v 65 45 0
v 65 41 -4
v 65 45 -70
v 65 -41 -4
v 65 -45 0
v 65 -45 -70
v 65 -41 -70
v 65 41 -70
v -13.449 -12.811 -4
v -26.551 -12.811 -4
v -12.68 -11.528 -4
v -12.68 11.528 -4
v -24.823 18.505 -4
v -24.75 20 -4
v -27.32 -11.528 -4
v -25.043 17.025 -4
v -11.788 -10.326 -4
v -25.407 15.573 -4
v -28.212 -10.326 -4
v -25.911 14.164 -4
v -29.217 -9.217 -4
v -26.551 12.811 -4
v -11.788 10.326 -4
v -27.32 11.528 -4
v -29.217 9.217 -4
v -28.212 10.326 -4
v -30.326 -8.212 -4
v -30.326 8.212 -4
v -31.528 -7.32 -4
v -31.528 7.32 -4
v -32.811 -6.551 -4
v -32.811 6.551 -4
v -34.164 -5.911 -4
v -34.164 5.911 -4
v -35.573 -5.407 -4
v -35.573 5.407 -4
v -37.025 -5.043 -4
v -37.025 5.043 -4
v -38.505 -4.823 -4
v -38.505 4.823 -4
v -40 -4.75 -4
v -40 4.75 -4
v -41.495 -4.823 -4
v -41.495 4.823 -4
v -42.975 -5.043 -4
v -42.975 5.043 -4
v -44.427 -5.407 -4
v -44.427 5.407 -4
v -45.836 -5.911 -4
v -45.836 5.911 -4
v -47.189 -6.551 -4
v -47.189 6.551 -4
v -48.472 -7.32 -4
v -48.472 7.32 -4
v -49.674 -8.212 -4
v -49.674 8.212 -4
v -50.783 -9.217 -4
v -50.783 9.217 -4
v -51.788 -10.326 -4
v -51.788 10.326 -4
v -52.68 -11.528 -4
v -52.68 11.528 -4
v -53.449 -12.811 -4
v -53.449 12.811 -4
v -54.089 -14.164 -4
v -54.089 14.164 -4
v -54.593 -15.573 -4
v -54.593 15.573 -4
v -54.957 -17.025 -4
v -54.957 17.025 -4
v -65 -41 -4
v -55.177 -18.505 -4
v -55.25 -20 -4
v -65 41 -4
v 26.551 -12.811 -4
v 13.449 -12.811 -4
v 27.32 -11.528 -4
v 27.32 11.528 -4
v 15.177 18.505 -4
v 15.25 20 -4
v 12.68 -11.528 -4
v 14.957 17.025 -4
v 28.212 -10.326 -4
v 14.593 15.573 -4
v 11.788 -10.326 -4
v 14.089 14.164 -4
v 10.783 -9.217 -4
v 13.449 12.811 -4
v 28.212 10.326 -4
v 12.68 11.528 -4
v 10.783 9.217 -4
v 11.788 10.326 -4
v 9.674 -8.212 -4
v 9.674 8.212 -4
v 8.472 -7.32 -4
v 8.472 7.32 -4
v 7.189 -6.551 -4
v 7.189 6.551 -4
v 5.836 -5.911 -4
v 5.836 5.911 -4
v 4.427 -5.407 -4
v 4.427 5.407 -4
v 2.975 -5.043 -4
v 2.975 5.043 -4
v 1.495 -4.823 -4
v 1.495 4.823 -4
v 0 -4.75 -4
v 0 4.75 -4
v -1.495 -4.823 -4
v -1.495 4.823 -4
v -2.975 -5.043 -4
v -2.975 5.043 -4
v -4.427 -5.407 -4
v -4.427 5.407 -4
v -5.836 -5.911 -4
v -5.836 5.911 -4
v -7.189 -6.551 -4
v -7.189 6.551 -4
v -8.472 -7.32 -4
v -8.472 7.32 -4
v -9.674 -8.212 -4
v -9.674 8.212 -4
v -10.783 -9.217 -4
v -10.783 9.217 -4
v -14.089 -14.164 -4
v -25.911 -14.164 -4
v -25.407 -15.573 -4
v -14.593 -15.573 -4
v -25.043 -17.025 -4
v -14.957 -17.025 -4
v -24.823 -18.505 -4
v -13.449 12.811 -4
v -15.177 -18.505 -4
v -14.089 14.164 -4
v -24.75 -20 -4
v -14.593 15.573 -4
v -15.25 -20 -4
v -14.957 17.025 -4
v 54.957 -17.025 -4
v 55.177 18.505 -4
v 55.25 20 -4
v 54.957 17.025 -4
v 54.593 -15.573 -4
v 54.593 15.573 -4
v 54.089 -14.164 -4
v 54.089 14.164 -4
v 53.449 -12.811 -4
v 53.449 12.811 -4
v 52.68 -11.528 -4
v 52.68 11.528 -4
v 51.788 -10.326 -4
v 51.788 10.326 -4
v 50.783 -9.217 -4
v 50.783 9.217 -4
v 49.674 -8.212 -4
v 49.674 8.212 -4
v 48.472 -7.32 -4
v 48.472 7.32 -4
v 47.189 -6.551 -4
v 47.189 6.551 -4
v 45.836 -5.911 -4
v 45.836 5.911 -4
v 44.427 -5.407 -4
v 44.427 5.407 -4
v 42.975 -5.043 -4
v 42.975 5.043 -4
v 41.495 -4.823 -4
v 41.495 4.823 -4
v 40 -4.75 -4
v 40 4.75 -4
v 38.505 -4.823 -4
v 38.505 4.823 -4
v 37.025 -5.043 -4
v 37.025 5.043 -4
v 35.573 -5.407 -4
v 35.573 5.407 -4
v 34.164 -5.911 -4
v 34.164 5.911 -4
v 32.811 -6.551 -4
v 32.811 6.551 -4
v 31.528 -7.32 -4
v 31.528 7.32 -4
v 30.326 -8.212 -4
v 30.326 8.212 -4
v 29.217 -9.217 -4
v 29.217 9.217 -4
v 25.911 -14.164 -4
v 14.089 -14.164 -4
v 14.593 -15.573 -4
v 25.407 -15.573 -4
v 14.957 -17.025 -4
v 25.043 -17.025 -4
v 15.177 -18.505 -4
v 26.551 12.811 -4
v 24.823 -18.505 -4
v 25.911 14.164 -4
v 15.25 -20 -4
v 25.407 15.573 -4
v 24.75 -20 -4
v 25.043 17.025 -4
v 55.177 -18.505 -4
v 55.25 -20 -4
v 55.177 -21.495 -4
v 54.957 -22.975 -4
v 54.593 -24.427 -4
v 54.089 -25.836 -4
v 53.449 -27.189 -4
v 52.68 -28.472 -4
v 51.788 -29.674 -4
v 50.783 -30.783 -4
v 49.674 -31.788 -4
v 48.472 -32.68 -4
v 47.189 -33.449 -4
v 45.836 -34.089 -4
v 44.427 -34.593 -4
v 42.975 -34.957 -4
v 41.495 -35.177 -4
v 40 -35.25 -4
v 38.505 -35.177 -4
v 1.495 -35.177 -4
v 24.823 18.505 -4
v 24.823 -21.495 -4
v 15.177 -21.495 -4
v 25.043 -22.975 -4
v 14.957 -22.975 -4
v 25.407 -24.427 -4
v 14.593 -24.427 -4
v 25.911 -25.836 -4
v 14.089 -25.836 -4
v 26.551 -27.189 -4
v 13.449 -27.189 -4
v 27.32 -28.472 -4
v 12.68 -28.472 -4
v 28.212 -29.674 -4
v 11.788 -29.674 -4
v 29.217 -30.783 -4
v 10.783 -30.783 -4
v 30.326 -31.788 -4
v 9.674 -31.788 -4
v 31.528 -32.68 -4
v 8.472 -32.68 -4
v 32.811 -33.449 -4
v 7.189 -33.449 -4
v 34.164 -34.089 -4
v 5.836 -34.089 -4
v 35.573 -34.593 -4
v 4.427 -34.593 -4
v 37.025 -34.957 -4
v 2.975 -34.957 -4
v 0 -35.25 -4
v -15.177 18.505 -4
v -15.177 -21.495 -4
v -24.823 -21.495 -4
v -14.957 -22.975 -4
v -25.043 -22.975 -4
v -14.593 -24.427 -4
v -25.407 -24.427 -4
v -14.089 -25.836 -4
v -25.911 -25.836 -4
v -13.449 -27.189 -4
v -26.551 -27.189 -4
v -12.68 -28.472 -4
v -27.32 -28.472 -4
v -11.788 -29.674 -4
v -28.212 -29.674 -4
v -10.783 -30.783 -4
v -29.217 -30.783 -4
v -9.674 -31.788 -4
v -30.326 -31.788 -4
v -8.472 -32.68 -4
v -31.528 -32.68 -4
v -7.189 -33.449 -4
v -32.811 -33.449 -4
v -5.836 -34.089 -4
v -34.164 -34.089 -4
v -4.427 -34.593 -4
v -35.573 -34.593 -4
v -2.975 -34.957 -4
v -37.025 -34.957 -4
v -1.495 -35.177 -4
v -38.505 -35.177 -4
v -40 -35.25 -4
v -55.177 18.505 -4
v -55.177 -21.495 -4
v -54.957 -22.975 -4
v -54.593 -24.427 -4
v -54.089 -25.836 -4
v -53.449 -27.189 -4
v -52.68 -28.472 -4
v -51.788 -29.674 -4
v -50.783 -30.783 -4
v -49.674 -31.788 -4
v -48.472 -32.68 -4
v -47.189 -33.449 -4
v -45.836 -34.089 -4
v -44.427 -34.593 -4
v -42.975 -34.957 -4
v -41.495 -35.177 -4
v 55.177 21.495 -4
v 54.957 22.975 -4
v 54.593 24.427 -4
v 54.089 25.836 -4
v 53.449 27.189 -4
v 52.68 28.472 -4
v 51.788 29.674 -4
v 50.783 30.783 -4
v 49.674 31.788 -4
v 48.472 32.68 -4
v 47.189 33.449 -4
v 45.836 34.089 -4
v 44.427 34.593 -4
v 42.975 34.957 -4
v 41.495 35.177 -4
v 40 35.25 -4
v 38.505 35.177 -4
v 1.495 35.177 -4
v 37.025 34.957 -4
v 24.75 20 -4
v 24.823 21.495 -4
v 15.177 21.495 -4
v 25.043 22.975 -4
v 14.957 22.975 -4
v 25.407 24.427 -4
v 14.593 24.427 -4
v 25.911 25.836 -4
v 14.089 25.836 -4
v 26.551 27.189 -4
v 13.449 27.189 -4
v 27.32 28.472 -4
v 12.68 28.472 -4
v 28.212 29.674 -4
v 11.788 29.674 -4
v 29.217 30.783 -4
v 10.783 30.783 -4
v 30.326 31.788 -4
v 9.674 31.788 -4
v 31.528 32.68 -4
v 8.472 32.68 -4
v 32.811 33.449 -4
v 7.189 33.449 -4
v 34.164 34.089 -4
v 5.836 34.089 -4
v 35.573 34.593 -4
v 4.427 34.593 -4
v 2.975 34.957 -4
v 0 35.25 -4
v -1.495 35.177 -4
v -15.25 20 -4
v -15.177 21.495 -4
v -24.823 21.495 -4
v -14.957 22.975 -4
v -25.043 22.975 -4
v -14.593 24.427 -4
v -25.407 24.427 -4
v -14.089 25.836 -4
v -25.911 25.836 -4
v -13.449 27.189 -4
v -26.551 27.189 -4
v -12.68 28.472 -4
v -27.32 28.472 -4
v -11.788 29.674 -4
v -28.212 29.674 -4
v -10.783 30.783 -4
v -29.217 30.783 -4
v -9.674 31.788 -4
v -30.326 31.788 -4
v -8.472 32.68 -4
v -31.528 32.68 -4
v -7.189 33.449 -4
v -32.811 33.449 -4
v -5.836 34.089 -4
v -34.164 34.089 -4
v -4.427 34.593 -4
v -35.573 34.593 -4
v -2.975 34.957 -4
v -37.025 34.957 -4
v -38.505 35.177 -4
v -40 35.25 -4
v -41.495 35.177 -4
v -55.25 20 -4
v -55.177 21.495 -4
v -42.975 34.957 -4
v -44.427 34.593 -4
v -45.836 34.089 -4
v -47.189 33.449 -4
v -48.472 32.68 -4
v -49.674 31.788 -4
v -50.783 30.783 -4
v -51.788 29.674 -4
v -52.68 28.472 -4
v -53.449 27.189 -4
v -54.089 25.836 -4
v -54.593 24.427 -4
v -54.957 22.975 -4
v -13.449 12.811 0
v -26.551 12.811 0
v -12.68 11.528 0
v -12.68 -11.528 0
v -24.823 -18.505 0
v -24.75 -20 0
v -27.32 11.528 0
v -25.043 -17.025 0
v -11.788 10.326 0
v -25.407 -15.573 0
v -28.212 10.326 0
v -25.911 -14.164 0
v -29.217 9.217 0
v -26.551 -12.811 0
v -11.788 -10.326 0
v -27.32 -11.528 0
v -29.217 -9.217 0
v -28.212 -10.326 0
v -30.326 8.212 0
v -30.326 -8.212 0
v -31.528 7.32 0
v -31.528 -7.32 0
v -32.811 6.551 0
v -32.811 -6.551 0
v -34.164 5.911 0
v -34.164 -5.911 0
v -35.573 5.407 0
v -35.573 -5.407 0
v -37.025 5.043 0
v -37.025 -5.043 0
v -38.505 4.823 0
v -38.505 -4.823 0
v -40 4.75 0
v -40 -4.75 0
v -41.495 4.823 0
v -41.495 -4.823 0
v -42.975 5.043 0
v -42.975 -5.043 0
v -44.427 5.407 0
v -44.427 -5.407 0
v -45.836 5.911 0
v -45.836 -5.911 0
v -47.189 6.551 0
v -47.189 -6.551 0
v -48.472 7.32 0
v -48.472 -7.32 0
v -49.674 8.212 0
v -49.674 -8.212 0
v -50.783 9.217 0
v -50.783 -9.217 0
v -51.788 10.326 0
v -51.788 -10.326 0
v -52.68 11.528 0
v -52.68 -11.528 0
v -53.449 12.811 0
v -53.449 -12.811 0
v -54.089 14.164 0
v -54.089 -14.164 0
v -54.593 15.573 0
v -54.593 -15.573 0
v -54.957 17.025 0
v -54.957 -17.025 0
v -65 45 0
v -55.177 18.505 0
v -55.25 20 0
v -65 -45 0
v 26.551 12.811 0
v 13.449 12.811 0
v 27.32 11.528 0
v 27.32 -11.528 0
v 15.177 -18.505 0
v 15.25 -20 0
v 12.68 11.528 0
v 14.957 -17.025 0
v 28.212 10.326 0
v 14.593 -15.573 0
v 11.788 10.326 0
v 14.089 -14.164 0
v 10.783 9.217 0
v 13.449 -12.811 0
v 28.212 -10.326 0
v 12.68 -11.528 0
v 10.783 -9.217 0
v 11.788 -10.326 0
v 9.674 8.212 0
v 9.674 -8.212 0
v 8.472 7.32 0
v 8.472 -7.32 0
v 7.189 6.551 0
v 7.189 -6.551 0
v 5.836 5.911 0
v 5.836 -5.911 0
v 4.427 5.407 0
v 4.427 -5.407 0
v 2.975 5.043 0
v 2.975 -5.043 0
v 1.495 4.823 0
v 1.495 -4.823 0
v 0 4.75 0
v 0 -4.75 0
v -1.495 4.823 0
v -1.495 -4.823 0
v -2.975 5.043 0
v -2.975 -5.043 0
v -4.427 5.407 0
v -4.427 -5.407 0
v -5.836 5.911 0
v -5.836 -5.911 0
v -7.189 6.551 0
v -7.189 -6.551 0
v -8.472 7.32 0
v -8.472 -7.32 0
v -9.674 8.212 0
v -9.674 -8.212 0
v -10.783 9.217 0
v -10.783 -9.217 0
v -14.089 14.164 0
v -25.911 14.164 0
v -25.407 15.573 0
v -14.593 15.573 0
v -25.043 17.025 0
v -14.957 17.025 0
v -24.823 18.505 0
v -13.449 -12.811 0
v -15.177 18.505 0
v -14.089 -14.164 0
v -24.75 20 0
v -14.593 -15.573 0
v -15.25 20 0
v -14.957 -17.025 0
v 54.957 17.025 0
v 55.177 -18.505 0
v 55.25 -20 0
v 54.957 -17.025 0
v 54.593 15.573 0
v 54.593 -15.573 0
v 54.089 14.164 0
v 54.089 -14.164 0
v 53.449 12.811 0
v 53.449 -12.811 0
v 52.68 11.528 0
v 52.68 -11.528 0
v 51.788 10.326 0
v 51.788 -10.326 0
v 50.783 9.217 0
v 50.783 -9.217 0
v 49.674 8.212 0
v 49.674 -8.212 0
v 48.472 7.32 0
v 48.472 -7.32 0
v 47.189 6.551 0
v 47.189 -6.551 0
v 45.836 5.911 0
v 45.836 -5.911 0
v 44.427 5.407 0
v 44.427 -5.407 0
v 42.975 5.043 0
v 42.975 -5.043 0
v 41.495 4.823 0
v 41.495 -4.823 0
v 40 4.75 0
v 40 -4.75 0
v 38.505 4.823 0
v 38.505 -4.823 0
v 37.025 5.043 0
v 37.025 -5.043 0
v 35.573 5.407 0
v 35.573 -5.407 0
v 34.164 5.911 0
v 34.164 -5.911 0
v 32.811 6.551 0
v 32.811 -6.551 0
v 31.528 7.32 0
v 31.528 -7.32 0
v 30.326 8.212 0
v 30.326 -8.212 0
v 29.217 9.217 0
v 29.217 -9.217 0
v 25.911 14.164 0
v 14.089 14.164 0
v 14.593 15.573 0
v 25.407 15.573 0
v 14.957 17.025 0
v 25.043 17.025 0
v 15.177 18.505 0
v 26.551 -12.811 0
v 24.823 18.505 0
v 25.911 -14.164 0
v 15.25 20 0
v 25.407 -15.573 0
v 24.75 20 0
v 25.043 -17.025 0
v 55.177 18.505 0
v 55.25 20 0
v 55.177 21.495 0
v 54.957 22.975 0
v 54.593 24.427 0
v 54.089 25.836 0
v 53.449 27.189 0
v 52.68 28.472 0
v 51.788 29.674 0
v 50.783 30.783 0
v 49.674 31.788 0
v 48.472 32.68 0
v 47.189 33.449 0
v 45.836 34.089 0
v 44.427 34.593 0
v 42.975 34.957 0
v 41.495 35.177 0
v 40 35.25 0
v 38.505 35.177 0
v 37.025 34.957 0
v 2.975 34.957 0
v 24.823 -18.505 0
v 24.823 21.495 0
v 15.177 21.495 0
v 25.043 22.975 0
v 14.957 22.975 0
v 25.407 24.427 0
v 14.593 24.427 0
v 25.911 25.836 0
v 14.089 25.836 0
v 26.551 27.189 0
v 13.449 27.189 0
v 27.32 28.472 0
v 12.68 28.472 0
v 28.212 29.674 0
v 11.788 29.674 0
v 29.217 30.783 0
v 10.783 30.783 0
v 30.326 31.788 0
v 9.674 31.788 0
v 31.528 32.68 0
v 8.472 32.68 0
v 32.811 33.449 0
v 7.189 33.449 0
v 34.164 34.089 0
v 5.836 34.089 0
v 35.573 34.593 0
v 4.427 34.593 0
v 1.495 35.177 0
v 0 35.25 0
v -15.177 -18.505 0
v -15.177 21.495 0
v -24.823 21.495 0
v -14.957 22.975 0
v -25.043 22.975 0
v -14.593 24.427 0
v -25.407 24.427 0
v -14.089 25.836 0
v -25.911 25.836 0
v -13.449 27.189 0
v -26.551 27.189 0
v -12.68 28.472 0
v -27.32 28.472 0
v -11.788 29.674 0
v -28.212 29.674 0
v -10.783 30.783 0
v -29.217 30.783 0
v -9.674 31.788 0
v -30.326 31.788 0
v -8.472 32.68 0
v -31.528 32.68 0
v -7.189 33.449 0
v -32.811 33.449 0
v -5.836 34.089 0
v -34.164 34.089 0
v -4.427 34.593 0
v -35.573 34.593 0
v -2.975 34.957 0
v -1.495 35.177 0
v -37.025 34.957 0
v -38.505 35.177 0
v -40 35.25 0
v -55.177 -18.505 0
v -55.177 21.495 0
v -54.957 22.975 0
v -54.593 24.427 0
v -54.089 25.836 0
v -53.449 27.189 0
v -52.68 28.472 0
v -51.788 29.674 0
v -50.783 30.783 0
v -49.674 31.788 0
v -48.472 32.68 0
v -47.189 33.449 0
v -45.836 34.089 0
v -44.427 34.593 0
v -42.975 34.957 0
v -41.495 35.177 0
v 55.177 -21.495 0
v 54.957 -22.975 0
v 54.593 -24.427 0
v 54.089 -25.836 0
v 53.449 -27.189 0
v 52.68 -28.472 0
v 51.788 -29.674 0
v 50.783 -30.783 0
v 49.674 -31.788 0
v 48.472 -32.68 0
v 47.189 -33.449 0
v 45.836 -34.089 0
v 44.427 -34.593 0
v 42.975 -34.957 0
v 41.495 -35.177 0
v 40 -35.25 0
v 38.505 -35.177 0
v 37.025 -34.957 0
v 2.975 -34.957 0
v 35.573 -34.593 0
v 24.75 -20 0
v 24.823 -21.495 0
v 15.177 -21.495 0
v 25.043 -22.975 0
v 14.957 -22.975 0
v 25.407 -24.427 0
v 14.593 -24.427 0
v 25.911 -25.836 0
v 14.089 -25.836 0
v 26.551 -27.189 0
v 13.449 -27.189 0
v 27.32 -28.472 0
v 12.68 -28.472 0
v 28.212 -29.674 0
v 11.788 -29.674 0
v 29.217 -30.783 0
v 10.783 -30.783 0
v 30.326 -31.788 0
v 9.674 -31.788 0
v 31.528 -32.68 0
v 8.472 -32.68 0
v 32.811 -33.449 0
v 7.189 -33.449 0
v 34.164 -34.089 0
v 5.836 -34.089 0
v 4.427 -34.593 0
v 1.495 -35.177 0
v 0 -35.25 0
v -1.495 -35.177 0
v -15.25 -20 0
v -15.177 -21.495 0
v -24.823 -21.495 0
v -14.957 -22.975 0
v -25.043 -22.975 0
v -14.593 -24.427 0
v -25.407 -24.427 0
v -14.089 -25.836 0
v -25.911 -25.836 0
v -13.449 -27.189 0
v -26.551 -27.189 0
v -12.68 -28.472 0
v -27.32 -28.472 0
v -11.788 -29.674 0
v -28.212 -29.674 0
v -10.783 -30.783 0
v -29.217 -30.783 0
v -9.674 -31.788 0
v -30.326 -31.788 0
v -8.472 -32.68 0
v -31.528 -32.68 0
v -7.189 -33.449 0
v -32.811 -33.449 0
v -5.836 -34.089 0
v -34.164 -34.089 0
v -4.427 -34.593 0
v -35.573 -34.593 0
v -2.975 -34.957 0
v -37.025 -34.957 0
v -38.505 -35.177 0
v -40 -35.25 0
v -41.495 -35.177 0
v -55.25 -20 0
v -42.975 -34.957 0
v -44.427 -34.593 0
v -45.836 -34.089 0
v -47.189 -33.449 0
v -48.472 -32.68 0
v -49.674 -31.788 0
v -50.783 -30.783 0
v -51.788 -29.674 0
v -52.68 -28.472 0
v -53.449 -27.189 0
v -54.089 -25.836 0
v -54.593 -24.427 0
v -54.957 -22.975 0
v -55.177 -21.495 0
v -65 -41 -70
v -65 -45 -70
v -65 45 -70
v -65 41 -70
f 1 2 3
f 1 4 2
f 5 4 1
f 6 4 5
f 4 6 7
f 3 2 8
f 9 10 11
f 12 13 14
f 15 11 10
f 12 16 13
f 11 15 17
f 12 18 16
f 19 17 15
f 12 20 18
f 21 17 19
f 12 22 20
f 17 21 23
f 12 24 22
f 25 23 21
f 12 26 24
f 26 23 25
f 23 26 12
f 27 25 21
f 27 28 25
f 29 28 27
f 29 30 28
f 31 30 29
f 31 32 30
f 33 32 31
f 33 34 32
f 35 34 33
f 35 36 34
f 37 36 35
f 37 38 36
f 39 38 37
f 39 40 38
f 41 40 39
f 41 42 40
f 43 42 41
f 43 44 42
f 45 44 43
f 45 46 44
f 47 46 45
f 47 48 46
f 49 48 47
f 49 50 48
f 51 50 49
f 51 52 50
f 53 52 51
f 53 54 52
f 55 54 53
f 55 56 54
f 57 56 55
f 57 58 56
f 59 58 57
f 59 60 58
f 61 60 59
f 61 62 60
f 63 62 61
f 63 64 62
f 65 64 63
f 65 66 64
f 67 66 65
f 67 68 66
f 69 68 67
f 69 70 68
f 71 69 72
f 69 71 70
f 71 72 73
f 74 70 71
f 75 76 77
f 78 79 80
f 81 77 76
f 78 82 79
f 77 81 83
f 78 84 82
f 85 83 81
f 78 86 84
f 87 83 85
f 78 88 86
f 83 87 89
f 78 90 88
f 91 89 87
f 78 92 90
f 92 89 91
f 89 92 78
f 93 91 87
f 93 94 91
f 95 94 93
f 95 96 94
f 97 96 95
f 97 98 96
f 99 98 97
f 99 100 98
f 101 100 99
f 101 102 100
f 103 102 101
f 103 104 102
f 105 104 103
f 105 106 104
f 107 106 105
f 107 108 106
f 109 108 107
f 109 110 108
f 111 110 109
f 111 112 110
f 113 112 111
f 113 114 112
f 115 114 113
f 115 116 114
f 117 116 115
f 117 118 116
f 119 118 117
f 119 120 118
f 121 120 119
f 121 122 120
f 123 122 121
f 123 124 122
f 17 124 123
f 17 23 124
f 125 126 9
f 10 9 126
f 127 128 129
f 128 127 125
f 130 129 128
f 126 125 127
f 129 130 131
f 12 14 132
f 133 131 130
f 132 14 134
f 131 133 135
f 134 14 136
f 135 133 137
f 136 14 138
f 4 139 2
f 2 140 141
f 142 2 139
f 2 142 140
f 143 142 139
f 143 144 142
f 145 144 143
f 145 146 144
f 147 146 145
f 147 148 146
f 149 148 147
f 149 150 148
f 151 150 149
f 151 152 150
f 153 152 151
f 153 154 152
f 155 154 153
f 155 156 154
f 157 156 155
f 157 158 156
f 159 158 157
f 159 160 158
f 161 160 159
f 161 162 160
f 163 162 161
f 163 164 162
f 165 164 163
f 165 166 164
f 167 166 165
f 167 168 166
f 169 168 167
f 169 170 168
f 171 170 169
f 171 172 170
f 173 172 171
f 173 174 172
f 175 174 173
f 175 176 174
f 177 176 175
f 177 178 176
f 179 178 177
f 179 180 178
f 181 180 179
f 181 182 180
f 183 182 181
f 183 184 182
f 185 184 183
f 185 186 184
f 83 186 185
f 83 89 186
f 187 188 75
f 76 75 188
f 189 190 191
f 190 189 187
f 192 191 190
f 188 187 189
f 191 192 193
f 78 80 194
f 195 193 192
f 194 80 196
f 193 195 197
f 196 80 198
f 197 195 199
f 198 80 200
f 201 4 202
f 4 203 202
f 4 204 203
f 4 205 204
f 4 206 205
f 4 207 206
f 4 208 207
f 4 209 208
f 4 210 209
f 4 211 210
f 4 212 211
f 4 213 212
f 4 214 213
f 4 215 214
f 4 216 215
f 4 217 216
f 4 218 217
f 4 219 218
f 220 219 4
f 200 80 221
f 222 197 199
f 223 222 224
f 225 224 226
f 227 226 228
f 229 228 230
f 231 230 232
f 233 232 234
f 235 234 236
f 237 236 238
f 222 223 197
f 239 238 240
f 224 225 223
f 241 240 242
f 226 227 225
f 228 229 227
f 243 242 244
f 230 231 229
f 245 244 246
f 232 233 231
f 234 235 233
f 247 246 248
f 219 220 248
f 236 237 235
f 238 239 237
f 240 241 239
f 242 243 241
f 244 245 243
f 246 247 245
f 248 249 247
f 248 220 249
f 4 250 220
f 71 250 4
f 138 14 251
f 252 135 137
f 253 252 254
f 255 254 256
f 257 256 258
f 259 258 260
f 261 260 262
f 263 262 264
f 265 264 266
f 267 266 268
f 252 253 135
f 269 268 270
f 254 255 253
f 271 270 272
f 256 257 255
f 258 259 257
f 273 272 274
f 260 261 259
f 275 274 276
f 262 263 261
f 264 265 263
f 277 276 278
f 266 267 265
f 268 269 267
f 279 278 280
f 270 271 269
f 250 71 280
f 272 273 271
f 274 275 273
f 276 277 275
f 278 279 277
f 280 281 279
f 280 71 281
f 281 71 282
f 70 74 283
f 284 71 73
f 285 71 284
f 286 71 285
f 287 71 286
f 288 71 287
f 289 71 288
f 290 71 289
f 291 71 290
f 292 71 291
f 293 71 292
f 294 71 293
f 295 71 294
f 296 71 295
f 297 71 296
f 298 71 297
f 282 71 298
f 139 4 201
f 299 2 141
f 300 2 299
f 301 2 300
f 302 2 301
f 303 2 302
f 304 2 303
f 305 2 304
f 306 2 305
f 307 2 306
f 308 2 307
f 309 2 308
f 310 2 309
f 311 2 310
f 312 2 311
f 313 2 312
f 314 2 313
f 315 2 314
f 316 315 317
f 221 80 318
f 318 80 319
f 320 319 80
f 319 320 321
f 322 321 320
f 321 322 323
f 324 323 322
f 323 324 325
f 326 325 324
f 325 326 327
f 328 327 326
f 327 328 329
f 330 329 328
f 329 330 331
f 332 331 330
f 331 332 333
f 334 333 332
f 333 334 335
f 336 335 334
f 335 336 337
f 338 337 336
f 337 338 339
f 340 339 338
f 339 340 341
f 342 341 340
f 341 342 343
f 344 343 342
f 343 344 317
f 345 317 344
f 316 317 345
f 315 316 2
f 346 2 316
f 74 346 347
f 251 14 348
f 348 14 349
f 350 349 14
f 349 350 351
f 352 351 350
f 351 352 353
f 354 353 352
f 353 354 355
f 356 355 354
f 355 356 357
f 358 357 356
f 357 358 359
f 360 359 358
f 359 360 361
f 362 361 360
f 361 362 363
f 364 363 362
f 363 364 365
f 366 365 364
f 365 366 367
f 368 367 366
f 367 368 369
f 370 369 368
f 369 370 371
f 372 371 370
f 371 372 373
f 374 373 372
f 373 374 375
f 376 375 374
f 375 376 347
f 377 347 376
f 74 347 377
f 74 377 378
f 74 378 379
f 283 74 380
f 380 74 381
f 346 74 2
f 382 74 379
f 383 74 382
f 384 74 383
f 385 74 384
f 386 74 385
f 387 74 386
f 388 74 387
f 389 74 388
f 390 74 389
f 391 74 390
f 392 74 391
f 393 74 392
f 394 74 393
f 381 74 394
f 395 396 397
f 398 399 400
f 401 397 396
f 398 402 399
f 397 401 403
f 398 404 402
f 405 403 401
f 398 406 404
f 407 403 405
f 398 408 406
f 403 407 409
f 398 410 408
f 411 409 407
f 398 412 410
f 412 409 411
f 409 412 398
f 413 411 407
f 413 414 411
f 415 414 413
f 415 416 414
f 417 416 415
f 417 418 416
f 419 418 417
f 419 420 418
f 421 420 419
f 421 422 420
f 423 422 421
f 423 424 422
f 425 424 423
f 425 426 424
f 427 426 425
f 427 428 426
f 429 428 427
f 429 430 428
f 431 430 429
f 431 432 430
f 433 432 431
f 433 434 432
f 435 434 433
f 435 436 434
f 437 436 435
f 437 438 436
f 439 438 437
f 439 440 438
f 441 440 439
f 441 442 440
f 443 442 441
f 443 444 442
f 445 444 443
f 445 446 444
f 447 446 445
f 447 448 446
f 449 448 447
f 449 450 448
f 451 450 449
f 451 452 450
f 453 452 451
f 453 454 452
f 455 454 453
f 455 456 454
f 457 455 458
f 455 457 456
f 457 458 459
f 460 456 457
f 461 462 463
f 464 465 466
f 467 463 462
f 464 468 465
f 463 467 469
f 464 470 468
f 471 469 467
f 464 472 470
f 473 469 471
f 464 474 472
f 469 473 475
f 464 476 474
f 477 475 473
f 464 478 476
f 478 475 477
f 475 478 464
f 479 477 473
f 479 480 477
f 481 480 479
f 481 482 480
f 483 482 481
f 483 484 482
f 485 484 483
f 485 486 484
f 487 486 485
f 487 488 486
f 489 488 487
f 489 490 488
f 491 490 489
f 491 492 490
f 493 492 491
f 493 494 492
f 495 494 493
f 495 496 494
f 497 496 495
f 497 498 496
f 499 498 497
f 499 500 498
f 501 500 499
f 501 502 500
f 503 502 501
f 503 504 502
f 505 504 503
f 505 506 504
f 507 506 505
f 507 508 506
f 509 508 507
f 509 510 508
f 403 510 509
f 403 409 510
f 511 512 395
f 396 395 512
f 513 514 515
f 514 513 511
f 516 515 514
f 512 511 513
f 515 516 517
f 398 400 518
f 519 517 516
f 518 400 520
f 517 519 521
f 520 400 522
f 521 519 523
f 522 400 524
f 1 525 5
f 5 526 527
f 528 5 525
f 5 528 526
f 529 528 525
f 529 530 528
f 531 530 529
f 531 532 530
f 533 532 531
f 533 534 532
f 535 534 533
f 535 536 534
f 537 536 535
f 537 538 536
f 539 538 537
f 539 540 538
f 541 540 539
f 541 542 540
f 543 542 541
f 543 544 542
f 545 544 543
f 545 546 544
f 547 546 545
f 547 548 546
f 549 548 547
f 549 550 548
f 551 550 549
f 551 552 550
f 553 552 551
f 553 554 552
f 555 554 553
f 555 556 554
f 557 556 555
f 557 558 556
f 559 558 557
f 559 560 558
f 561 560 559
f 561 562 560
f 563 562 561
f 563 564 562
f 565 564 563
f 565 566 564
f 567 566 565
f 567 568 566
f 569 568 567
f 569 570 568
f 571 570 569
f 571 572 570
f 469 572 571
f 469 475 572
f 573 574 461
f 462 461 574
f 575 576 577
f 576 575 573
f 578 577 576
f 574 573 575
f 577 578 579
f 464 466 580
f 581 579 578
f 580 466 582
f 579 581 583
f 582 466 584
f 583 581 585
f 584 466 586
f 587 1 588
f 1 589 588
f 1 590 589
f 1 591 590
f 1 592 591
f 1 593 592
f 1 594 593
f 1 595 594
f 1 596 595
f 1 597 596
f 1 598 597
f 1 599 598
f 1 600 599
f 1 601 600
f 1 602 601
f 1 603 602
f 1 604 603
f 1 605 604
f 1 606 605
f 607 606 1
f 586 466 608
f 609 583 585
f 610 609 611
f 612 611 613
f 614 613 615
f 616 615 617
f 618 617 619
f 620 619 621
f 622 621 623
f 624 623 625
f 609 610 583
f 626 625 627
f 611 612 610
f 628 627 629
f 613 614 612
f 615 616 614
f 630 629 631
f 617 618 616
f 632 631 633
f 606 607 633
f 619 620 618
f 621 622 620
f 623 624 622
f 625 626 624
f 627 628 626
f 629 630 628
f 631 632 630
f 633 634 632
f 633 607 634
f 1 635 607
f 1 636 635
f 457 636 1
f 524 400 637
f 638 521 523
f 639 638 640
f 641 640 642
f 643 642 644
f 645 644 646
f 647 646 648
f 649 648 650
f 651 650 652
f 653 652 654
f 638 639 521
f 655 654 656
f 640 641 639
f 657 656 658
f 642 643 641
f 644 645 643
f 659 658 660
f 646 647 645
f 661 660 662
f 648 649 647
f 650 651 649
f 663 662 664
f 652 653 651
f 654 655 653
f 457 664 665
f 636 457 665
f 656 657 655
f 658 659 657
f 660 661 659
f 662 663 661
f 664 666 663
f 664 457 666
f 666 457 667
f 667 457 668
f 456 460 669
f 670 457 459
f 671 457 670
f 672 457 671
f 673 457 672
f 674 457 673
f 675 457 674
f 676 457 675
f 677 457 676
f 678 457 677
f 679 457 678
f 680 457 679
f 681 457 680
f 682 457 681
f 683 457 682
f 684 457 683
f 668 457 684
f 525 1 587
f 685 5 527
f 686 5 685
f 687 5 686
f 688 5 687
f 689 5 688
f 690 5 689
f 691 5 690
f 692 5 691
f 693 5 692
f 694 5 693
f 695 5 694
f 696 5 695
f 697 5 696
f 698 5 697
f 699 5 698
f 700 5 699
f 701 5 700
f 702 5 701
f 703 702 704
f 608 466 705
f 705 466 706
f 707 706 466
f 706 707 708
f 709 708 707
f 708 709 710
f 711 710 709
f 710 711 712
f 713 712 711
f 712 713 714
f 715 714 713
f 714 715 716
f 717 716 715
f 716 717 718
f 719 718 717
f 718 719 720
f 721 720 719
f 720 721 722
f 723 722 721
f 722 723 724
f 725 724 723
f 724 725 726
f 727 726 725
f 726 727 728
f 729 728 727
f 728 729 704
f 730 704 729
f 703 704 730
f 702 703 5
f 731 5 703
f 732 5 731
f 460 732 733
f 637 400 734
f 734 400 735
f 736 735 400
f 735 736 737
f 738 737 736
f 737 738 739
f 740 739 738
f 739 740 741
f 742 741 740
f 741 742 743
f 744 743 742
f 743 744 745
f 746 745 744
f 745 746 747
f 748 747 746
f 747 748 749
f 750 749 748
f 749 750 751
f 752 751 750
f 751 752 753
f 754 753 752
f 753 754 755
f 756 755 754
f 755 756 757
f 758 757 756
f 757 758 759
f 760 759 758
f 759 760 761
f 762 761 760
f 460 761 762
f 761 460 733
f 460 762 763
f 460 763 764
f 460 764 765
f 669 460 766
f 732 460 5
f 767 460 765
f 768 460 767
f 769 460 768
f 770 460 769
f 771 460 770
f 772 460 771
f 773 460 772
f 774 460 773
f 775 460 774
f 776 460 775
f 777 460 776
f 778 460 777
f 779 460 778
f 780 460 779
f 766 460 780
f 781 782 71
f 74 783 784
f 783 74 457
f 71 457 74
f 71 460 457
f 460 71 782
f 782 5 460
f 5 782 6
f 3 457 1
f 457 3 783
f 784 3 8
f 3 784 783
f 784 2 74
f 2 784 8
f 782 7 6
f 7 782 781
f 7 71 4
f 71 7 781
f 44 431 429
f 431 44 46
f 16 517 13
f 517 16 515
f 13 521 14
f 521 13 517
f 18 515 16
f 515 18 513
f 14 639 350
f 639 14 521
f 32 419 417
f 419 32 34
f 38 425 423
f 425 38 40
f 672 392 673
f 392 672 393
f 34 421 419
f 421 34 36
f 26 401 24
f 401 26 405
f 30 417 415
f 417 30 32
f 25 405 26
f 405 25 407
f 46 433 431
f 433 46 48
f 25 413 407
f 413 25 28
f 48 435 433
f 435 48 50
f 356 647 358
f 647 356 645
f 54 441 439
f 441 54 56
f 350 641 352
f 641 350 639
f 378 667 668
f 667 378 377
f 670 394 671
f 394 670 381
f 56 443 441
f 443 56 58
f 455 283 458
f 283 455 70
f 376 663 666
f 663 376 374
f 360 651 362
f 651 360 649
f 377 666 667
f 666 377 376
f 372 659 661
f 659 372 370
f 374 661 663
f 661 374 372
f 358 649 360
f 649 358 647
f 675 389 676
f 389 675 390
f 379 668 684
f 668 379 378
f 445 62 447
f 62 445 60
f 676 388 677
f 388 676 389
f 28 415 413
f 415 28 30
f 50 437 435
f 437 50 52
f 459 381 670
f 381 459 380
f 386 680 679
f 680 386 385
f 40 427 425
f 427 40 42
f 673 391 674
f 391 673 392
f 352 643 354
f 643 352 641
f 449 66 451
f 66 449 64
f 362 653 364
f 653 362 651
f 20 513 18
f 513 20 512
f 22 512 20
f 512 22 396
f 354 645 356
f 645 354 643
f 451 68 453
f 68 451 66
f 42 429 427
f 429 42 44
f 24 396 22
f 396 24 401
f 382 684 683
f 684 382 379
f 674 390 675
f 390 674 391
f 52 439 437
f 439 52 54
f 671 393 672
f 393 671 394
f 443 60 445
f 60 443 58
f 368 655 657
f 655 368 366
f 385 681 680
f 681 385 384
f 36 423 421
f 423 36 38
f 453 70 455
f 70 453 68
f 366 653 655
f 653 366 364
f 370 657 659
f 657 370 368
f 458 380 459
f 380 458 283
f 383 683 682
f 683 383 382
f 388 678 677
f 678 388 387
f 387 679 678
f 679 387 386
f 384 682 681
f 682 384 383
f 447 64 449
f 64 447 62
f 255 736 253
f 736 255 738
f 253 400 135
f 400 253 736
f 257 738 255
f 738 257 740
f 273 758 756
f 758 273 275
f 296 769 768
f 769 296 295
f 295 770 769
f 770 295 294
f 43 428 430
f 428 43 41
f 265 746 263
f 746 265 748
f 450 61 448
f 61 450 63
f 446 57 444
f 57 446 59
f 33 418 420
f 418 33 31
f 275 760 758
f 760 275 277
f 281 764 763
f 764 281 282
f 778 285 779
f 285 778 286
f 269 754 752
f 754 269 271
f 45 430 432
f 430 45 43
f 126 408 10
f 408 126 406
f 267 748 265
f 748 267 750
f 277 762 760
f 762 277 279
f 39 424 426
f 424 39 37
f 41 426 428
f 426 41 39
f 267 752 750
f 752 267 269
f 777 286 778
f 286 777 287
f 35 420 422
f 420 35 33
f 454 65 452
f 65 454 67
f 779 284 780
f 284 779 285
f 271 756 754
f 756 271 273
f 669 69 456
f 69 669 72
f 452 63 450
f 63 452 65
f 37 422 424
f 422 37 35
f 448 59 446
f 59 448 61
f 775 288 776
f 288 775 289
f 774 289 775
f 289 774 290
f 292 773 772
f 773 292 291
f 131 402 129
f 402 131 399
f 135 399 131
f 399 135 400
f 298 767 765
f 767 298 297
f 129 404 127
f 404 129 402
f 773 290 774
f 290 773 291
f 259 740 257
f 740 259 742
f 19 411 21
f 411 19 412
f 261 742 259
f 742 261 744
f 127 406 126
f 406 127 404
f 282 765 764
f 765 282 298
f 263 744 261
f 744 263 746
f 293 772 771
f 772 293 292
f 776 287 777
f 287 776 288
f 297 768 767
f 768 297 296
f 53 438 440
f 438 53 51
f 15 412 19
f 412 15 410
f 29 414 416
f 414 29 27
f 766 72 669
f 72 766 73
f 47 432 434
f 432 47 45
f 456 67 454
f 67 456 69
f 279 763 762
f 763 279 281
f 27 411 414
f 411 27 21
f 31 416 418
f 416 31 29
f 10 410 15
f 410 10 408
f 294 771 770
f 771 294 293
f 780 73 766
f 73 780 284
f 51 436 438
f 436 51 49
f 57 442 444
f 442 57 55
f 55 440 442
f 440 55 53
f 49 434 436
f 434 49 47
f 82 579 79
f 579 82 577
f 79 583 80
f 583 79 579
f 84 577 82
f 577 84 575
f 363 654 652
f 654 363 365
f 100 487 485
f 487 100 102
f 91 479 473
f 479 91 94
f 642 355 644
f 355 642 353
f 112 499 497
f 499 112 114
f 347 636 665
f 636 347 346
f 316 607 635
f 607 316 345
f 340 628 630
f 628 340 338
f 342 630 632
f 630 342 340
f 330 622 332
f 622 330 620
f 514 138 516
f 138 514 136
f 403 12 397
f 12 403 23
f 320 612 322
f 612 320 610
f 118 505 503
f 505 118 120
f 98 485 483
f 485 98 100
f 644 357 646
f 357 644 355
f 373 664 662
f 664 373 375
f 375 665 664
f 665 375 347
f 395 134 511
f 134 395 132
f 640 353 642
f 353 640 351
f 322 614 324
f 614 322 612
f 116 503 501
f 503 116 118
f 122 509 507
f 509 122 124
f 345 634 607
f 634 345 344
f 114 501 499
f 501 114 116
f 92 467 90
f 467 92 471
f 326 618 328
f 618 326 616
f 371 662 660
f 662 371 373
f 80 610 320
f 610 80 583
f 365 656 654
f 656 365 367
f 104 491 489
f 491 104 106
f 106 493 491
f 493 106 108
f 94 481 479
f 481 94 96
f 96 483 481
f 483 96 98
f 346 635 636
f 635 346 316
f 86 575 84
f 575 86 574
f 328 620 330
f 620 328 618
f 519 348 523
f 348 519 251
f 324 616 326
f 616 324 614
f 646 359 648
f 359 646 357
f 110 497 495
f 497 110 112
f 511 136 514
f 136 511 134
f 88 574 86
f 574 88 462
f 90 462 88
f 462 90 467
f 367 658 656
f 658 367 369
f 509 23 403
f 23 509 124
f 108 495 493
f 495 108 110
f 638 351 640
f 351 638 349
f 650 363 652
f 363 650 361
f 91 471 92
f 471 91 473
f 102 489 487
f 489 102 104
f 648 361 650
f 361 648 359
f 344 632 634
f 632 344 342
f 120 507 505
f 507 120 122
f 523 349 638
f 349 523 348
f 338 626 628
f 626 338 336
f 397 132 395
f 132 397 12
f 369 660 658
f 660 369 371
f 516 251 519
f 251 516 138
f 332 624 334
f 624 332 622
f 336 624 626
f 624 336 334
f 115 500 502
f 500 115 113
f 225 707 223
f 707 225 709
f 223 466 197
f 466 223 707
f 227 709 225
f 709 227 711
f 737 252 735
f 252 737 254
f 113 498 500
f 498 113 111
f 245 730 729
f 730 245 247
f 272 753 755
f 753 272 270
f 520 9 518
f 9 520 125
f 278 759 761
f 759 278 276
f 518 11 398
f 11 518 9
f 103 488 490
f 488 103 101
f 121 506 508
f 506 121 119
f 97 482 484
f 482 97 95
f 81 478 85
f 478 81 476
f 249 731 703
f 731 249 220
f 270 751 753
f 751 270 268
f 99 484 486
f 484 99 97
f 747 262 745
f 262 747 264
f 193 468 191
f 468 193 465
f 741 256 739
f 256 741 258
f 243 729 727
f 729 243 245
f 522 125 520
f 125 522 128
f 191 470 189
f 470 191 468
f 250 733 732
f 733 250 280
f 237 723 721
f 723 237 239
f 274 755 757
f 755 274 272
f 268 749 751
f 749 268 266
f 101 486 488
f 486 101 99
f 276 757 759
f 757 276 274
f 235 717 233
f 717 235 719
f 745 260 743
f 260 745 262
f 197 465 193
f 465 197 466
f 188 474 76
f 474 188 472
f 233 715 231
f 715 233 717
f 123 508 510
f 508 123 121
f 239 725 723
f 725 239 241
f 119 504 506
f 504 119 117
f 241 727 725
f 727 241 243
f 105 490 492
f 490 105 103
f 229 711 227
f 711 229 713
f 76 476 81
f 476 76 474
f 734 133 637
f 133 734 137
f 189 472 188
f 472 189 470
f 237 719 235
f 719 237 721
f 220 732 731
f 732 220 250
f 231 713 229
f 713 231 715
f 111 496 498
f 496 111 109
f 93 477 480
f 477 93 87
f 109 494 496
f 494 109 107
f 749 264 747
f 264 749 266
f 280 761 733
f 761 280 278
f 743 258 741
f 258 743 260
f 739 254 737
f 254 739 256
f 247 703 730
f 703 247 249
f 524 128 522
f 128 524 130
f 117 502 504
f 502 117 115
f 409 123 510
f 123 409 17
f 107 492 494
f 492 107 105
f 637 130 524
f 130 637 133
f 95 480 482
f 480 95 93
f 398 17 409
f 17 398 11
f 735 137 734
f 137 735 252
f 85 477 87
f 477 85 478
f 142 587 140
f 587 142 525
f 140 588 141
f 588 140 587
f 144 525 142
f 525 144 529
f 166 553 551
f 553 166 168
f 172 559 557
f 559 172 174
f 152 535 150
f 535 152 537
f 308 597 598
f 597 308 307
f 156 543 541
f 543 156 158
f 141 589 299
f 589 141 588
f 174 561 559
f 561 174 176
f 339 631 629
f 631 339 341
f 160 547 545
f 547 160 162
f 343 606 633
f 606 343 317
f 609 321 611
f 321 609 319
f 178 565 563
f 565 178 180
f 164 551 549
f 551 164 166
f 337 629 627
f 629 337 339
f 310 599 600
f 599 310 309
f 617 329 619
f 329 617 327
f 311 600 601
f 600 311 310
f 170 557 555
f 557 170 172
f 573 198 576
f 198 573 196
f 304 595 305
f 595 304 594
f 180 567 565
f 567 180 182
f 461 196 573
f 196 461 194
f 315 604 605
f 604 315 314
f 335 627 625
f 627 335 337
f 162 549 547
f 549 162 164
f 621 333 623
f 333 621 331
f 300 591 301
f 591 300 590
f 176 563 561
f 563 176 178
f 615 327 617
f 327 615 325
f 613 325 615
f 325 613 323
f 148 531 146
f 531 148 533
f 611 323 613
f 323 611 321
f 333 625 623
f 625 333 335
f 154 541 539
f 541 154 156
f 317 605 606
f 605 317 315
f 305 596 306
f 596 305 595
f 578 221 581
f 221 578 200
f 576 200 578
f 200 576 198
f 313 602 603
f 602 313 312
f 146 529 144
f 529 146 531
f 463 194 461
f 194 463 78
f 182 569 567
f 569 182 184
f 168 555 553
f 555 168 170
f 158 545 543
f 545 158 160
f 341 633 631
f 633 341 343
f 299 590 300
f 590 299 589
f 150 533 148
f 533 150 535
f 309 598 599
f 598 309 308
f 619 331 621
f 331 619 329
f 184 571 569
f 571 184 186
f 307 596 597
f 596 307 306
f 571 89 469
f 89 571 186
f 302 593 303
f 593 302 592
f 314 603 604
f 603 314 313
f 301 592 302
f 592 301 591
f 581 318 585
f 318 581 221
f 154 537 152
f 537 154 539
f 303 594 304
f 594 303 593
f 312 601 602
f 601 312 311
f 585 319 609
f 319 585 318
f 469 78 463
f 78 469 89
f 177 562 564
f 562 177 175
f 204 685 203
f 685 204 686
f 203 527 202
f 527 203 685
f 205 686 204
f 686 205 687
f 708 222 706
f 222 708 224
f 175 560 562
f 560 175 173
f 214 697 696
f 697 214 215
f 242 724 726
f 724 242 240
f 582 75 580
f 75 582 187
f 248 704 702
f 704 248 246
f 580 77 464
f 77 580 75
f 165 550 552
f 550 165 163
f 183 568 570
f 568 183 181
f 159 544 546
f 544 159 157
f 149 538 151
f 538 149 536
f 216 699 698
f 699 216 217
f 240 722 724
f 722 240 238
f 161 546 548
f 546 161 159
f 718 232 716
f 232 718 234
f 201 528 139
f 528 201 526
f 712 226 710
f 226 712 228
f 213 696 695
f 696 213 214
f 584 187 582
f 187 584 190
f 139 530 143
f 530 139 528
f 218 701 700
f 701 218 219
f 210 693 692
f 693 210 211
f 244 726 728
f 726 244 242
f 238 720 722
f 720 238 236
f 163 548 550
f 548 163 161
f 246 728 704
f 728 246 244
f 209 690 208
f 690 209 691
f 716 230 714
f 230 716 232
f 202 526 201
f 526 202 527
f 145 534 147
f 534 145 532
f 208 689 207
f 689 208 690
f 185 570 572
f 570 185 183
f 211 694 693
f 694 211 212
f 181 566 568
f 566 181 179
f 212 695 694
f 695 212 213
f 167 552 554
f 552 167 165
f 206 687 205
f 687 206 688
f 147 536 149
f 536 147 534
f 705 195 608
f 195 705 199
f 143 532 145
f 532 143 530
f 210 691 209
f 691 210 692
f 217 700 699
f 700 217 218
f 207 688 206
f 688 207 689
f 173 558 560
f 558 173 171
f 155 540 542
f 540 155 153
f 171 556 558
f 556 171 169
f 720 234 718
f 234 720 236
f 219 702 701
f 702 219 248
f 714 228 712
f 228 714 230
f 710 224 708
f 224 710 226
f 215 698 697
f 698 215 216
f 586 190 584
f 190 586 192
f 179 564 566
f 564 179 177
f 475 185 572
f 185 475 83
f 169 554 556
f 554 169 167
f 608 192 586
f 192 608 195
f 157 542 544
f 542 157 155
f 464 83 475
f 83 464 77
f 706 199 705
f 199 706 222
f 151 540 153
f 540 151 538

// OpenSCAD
// 50mL Conical Tube Rack
// Designed for printing upside down (walls at Z=0 to Z=66) 
// and flipped to stand on the walls.

// --- Dimensions ---
plate_x      = 130.0; // Length of the plate (X)
plate_y      = 90.0;  // Width of the plate (Y)
plate_z      = 4.0;   // Thickness of the plate (Z)

hole_d       = 30.5;  // Diameter of the tube holes
rows         = 2;     // Number of rows (along Y)
cols         = 3;     // Number of columns (along X)
spacing      = 40.0;  // Center-to-center distance between holes

wall_x       = 130.0; // Length of the side walls (X)
wall_y       = 4.0;   // Thickness of the side walls (Y)
wall_h       = 70.0;  // Total height of the walls from the base (Z)

$fn = 64;

// --- Calculations ---
// Calculate offsets to center the grid of holes on the plate
x_offset = (cols - 1) * spacing / 2;
y_offset = (rows - 1) * spacing / 2;

// The user specifies the part is printed "upside down".
// In OpenSCAD, we model the part in its final functional orientation 
// and then rotate/translate it to the print orientation.
// Functional orientation: Plate at Z=0, Walls rising to Z=70.
// Print orientation: Walls at Z=0, Plate at Z=66.

module functional_rack() {
    difference() {
        union() {
            // The Base Plate
            translate([-plate_x/2, -plate_y/2, 0])
                cube([plate_x, plate_y, plate_z]);
            
            // The Two Side Walls
            // Wall 1 (along one long edge)
            translate([-plate_x/2, -plate_y/2, plate_z])
                cube([plate_x, wall_y, wall_h - plate_z]);
            
            // Wall 2 (along the other long edge)
            translate([-plate_x/2, plate_y/2 - wall_y, plate_z])
                cube([plate_x, wall_y, wall_h - plate_z]);
        }

        // The Six Holes
        for (i = [0 : cols - 1]) {
            for (j = [0 : rows - 1]) {
                // Calculate hole position relative to center
                hx = (i * spacing) - x_offset;
                hy = (j * spacing) - y_offset;
                
                // Subtracting the hole. 
                // We extend the hole in Z to ensure a clean cut through the plate.
                translate([hx, hy, -1])
                    cylinder(h = plate_z + 2, d = hole_d);
            }
        }
    }
}

// --- Print Orientation Logic ---
// The user wants to print it "upside down".
// This means the walls are on the bed (Z=0) and the plate is at the top.
// To achieve this, we rotate the functional model 180 degrees around the X axis.

rotate([180, 0, 0]) functional_rack();
